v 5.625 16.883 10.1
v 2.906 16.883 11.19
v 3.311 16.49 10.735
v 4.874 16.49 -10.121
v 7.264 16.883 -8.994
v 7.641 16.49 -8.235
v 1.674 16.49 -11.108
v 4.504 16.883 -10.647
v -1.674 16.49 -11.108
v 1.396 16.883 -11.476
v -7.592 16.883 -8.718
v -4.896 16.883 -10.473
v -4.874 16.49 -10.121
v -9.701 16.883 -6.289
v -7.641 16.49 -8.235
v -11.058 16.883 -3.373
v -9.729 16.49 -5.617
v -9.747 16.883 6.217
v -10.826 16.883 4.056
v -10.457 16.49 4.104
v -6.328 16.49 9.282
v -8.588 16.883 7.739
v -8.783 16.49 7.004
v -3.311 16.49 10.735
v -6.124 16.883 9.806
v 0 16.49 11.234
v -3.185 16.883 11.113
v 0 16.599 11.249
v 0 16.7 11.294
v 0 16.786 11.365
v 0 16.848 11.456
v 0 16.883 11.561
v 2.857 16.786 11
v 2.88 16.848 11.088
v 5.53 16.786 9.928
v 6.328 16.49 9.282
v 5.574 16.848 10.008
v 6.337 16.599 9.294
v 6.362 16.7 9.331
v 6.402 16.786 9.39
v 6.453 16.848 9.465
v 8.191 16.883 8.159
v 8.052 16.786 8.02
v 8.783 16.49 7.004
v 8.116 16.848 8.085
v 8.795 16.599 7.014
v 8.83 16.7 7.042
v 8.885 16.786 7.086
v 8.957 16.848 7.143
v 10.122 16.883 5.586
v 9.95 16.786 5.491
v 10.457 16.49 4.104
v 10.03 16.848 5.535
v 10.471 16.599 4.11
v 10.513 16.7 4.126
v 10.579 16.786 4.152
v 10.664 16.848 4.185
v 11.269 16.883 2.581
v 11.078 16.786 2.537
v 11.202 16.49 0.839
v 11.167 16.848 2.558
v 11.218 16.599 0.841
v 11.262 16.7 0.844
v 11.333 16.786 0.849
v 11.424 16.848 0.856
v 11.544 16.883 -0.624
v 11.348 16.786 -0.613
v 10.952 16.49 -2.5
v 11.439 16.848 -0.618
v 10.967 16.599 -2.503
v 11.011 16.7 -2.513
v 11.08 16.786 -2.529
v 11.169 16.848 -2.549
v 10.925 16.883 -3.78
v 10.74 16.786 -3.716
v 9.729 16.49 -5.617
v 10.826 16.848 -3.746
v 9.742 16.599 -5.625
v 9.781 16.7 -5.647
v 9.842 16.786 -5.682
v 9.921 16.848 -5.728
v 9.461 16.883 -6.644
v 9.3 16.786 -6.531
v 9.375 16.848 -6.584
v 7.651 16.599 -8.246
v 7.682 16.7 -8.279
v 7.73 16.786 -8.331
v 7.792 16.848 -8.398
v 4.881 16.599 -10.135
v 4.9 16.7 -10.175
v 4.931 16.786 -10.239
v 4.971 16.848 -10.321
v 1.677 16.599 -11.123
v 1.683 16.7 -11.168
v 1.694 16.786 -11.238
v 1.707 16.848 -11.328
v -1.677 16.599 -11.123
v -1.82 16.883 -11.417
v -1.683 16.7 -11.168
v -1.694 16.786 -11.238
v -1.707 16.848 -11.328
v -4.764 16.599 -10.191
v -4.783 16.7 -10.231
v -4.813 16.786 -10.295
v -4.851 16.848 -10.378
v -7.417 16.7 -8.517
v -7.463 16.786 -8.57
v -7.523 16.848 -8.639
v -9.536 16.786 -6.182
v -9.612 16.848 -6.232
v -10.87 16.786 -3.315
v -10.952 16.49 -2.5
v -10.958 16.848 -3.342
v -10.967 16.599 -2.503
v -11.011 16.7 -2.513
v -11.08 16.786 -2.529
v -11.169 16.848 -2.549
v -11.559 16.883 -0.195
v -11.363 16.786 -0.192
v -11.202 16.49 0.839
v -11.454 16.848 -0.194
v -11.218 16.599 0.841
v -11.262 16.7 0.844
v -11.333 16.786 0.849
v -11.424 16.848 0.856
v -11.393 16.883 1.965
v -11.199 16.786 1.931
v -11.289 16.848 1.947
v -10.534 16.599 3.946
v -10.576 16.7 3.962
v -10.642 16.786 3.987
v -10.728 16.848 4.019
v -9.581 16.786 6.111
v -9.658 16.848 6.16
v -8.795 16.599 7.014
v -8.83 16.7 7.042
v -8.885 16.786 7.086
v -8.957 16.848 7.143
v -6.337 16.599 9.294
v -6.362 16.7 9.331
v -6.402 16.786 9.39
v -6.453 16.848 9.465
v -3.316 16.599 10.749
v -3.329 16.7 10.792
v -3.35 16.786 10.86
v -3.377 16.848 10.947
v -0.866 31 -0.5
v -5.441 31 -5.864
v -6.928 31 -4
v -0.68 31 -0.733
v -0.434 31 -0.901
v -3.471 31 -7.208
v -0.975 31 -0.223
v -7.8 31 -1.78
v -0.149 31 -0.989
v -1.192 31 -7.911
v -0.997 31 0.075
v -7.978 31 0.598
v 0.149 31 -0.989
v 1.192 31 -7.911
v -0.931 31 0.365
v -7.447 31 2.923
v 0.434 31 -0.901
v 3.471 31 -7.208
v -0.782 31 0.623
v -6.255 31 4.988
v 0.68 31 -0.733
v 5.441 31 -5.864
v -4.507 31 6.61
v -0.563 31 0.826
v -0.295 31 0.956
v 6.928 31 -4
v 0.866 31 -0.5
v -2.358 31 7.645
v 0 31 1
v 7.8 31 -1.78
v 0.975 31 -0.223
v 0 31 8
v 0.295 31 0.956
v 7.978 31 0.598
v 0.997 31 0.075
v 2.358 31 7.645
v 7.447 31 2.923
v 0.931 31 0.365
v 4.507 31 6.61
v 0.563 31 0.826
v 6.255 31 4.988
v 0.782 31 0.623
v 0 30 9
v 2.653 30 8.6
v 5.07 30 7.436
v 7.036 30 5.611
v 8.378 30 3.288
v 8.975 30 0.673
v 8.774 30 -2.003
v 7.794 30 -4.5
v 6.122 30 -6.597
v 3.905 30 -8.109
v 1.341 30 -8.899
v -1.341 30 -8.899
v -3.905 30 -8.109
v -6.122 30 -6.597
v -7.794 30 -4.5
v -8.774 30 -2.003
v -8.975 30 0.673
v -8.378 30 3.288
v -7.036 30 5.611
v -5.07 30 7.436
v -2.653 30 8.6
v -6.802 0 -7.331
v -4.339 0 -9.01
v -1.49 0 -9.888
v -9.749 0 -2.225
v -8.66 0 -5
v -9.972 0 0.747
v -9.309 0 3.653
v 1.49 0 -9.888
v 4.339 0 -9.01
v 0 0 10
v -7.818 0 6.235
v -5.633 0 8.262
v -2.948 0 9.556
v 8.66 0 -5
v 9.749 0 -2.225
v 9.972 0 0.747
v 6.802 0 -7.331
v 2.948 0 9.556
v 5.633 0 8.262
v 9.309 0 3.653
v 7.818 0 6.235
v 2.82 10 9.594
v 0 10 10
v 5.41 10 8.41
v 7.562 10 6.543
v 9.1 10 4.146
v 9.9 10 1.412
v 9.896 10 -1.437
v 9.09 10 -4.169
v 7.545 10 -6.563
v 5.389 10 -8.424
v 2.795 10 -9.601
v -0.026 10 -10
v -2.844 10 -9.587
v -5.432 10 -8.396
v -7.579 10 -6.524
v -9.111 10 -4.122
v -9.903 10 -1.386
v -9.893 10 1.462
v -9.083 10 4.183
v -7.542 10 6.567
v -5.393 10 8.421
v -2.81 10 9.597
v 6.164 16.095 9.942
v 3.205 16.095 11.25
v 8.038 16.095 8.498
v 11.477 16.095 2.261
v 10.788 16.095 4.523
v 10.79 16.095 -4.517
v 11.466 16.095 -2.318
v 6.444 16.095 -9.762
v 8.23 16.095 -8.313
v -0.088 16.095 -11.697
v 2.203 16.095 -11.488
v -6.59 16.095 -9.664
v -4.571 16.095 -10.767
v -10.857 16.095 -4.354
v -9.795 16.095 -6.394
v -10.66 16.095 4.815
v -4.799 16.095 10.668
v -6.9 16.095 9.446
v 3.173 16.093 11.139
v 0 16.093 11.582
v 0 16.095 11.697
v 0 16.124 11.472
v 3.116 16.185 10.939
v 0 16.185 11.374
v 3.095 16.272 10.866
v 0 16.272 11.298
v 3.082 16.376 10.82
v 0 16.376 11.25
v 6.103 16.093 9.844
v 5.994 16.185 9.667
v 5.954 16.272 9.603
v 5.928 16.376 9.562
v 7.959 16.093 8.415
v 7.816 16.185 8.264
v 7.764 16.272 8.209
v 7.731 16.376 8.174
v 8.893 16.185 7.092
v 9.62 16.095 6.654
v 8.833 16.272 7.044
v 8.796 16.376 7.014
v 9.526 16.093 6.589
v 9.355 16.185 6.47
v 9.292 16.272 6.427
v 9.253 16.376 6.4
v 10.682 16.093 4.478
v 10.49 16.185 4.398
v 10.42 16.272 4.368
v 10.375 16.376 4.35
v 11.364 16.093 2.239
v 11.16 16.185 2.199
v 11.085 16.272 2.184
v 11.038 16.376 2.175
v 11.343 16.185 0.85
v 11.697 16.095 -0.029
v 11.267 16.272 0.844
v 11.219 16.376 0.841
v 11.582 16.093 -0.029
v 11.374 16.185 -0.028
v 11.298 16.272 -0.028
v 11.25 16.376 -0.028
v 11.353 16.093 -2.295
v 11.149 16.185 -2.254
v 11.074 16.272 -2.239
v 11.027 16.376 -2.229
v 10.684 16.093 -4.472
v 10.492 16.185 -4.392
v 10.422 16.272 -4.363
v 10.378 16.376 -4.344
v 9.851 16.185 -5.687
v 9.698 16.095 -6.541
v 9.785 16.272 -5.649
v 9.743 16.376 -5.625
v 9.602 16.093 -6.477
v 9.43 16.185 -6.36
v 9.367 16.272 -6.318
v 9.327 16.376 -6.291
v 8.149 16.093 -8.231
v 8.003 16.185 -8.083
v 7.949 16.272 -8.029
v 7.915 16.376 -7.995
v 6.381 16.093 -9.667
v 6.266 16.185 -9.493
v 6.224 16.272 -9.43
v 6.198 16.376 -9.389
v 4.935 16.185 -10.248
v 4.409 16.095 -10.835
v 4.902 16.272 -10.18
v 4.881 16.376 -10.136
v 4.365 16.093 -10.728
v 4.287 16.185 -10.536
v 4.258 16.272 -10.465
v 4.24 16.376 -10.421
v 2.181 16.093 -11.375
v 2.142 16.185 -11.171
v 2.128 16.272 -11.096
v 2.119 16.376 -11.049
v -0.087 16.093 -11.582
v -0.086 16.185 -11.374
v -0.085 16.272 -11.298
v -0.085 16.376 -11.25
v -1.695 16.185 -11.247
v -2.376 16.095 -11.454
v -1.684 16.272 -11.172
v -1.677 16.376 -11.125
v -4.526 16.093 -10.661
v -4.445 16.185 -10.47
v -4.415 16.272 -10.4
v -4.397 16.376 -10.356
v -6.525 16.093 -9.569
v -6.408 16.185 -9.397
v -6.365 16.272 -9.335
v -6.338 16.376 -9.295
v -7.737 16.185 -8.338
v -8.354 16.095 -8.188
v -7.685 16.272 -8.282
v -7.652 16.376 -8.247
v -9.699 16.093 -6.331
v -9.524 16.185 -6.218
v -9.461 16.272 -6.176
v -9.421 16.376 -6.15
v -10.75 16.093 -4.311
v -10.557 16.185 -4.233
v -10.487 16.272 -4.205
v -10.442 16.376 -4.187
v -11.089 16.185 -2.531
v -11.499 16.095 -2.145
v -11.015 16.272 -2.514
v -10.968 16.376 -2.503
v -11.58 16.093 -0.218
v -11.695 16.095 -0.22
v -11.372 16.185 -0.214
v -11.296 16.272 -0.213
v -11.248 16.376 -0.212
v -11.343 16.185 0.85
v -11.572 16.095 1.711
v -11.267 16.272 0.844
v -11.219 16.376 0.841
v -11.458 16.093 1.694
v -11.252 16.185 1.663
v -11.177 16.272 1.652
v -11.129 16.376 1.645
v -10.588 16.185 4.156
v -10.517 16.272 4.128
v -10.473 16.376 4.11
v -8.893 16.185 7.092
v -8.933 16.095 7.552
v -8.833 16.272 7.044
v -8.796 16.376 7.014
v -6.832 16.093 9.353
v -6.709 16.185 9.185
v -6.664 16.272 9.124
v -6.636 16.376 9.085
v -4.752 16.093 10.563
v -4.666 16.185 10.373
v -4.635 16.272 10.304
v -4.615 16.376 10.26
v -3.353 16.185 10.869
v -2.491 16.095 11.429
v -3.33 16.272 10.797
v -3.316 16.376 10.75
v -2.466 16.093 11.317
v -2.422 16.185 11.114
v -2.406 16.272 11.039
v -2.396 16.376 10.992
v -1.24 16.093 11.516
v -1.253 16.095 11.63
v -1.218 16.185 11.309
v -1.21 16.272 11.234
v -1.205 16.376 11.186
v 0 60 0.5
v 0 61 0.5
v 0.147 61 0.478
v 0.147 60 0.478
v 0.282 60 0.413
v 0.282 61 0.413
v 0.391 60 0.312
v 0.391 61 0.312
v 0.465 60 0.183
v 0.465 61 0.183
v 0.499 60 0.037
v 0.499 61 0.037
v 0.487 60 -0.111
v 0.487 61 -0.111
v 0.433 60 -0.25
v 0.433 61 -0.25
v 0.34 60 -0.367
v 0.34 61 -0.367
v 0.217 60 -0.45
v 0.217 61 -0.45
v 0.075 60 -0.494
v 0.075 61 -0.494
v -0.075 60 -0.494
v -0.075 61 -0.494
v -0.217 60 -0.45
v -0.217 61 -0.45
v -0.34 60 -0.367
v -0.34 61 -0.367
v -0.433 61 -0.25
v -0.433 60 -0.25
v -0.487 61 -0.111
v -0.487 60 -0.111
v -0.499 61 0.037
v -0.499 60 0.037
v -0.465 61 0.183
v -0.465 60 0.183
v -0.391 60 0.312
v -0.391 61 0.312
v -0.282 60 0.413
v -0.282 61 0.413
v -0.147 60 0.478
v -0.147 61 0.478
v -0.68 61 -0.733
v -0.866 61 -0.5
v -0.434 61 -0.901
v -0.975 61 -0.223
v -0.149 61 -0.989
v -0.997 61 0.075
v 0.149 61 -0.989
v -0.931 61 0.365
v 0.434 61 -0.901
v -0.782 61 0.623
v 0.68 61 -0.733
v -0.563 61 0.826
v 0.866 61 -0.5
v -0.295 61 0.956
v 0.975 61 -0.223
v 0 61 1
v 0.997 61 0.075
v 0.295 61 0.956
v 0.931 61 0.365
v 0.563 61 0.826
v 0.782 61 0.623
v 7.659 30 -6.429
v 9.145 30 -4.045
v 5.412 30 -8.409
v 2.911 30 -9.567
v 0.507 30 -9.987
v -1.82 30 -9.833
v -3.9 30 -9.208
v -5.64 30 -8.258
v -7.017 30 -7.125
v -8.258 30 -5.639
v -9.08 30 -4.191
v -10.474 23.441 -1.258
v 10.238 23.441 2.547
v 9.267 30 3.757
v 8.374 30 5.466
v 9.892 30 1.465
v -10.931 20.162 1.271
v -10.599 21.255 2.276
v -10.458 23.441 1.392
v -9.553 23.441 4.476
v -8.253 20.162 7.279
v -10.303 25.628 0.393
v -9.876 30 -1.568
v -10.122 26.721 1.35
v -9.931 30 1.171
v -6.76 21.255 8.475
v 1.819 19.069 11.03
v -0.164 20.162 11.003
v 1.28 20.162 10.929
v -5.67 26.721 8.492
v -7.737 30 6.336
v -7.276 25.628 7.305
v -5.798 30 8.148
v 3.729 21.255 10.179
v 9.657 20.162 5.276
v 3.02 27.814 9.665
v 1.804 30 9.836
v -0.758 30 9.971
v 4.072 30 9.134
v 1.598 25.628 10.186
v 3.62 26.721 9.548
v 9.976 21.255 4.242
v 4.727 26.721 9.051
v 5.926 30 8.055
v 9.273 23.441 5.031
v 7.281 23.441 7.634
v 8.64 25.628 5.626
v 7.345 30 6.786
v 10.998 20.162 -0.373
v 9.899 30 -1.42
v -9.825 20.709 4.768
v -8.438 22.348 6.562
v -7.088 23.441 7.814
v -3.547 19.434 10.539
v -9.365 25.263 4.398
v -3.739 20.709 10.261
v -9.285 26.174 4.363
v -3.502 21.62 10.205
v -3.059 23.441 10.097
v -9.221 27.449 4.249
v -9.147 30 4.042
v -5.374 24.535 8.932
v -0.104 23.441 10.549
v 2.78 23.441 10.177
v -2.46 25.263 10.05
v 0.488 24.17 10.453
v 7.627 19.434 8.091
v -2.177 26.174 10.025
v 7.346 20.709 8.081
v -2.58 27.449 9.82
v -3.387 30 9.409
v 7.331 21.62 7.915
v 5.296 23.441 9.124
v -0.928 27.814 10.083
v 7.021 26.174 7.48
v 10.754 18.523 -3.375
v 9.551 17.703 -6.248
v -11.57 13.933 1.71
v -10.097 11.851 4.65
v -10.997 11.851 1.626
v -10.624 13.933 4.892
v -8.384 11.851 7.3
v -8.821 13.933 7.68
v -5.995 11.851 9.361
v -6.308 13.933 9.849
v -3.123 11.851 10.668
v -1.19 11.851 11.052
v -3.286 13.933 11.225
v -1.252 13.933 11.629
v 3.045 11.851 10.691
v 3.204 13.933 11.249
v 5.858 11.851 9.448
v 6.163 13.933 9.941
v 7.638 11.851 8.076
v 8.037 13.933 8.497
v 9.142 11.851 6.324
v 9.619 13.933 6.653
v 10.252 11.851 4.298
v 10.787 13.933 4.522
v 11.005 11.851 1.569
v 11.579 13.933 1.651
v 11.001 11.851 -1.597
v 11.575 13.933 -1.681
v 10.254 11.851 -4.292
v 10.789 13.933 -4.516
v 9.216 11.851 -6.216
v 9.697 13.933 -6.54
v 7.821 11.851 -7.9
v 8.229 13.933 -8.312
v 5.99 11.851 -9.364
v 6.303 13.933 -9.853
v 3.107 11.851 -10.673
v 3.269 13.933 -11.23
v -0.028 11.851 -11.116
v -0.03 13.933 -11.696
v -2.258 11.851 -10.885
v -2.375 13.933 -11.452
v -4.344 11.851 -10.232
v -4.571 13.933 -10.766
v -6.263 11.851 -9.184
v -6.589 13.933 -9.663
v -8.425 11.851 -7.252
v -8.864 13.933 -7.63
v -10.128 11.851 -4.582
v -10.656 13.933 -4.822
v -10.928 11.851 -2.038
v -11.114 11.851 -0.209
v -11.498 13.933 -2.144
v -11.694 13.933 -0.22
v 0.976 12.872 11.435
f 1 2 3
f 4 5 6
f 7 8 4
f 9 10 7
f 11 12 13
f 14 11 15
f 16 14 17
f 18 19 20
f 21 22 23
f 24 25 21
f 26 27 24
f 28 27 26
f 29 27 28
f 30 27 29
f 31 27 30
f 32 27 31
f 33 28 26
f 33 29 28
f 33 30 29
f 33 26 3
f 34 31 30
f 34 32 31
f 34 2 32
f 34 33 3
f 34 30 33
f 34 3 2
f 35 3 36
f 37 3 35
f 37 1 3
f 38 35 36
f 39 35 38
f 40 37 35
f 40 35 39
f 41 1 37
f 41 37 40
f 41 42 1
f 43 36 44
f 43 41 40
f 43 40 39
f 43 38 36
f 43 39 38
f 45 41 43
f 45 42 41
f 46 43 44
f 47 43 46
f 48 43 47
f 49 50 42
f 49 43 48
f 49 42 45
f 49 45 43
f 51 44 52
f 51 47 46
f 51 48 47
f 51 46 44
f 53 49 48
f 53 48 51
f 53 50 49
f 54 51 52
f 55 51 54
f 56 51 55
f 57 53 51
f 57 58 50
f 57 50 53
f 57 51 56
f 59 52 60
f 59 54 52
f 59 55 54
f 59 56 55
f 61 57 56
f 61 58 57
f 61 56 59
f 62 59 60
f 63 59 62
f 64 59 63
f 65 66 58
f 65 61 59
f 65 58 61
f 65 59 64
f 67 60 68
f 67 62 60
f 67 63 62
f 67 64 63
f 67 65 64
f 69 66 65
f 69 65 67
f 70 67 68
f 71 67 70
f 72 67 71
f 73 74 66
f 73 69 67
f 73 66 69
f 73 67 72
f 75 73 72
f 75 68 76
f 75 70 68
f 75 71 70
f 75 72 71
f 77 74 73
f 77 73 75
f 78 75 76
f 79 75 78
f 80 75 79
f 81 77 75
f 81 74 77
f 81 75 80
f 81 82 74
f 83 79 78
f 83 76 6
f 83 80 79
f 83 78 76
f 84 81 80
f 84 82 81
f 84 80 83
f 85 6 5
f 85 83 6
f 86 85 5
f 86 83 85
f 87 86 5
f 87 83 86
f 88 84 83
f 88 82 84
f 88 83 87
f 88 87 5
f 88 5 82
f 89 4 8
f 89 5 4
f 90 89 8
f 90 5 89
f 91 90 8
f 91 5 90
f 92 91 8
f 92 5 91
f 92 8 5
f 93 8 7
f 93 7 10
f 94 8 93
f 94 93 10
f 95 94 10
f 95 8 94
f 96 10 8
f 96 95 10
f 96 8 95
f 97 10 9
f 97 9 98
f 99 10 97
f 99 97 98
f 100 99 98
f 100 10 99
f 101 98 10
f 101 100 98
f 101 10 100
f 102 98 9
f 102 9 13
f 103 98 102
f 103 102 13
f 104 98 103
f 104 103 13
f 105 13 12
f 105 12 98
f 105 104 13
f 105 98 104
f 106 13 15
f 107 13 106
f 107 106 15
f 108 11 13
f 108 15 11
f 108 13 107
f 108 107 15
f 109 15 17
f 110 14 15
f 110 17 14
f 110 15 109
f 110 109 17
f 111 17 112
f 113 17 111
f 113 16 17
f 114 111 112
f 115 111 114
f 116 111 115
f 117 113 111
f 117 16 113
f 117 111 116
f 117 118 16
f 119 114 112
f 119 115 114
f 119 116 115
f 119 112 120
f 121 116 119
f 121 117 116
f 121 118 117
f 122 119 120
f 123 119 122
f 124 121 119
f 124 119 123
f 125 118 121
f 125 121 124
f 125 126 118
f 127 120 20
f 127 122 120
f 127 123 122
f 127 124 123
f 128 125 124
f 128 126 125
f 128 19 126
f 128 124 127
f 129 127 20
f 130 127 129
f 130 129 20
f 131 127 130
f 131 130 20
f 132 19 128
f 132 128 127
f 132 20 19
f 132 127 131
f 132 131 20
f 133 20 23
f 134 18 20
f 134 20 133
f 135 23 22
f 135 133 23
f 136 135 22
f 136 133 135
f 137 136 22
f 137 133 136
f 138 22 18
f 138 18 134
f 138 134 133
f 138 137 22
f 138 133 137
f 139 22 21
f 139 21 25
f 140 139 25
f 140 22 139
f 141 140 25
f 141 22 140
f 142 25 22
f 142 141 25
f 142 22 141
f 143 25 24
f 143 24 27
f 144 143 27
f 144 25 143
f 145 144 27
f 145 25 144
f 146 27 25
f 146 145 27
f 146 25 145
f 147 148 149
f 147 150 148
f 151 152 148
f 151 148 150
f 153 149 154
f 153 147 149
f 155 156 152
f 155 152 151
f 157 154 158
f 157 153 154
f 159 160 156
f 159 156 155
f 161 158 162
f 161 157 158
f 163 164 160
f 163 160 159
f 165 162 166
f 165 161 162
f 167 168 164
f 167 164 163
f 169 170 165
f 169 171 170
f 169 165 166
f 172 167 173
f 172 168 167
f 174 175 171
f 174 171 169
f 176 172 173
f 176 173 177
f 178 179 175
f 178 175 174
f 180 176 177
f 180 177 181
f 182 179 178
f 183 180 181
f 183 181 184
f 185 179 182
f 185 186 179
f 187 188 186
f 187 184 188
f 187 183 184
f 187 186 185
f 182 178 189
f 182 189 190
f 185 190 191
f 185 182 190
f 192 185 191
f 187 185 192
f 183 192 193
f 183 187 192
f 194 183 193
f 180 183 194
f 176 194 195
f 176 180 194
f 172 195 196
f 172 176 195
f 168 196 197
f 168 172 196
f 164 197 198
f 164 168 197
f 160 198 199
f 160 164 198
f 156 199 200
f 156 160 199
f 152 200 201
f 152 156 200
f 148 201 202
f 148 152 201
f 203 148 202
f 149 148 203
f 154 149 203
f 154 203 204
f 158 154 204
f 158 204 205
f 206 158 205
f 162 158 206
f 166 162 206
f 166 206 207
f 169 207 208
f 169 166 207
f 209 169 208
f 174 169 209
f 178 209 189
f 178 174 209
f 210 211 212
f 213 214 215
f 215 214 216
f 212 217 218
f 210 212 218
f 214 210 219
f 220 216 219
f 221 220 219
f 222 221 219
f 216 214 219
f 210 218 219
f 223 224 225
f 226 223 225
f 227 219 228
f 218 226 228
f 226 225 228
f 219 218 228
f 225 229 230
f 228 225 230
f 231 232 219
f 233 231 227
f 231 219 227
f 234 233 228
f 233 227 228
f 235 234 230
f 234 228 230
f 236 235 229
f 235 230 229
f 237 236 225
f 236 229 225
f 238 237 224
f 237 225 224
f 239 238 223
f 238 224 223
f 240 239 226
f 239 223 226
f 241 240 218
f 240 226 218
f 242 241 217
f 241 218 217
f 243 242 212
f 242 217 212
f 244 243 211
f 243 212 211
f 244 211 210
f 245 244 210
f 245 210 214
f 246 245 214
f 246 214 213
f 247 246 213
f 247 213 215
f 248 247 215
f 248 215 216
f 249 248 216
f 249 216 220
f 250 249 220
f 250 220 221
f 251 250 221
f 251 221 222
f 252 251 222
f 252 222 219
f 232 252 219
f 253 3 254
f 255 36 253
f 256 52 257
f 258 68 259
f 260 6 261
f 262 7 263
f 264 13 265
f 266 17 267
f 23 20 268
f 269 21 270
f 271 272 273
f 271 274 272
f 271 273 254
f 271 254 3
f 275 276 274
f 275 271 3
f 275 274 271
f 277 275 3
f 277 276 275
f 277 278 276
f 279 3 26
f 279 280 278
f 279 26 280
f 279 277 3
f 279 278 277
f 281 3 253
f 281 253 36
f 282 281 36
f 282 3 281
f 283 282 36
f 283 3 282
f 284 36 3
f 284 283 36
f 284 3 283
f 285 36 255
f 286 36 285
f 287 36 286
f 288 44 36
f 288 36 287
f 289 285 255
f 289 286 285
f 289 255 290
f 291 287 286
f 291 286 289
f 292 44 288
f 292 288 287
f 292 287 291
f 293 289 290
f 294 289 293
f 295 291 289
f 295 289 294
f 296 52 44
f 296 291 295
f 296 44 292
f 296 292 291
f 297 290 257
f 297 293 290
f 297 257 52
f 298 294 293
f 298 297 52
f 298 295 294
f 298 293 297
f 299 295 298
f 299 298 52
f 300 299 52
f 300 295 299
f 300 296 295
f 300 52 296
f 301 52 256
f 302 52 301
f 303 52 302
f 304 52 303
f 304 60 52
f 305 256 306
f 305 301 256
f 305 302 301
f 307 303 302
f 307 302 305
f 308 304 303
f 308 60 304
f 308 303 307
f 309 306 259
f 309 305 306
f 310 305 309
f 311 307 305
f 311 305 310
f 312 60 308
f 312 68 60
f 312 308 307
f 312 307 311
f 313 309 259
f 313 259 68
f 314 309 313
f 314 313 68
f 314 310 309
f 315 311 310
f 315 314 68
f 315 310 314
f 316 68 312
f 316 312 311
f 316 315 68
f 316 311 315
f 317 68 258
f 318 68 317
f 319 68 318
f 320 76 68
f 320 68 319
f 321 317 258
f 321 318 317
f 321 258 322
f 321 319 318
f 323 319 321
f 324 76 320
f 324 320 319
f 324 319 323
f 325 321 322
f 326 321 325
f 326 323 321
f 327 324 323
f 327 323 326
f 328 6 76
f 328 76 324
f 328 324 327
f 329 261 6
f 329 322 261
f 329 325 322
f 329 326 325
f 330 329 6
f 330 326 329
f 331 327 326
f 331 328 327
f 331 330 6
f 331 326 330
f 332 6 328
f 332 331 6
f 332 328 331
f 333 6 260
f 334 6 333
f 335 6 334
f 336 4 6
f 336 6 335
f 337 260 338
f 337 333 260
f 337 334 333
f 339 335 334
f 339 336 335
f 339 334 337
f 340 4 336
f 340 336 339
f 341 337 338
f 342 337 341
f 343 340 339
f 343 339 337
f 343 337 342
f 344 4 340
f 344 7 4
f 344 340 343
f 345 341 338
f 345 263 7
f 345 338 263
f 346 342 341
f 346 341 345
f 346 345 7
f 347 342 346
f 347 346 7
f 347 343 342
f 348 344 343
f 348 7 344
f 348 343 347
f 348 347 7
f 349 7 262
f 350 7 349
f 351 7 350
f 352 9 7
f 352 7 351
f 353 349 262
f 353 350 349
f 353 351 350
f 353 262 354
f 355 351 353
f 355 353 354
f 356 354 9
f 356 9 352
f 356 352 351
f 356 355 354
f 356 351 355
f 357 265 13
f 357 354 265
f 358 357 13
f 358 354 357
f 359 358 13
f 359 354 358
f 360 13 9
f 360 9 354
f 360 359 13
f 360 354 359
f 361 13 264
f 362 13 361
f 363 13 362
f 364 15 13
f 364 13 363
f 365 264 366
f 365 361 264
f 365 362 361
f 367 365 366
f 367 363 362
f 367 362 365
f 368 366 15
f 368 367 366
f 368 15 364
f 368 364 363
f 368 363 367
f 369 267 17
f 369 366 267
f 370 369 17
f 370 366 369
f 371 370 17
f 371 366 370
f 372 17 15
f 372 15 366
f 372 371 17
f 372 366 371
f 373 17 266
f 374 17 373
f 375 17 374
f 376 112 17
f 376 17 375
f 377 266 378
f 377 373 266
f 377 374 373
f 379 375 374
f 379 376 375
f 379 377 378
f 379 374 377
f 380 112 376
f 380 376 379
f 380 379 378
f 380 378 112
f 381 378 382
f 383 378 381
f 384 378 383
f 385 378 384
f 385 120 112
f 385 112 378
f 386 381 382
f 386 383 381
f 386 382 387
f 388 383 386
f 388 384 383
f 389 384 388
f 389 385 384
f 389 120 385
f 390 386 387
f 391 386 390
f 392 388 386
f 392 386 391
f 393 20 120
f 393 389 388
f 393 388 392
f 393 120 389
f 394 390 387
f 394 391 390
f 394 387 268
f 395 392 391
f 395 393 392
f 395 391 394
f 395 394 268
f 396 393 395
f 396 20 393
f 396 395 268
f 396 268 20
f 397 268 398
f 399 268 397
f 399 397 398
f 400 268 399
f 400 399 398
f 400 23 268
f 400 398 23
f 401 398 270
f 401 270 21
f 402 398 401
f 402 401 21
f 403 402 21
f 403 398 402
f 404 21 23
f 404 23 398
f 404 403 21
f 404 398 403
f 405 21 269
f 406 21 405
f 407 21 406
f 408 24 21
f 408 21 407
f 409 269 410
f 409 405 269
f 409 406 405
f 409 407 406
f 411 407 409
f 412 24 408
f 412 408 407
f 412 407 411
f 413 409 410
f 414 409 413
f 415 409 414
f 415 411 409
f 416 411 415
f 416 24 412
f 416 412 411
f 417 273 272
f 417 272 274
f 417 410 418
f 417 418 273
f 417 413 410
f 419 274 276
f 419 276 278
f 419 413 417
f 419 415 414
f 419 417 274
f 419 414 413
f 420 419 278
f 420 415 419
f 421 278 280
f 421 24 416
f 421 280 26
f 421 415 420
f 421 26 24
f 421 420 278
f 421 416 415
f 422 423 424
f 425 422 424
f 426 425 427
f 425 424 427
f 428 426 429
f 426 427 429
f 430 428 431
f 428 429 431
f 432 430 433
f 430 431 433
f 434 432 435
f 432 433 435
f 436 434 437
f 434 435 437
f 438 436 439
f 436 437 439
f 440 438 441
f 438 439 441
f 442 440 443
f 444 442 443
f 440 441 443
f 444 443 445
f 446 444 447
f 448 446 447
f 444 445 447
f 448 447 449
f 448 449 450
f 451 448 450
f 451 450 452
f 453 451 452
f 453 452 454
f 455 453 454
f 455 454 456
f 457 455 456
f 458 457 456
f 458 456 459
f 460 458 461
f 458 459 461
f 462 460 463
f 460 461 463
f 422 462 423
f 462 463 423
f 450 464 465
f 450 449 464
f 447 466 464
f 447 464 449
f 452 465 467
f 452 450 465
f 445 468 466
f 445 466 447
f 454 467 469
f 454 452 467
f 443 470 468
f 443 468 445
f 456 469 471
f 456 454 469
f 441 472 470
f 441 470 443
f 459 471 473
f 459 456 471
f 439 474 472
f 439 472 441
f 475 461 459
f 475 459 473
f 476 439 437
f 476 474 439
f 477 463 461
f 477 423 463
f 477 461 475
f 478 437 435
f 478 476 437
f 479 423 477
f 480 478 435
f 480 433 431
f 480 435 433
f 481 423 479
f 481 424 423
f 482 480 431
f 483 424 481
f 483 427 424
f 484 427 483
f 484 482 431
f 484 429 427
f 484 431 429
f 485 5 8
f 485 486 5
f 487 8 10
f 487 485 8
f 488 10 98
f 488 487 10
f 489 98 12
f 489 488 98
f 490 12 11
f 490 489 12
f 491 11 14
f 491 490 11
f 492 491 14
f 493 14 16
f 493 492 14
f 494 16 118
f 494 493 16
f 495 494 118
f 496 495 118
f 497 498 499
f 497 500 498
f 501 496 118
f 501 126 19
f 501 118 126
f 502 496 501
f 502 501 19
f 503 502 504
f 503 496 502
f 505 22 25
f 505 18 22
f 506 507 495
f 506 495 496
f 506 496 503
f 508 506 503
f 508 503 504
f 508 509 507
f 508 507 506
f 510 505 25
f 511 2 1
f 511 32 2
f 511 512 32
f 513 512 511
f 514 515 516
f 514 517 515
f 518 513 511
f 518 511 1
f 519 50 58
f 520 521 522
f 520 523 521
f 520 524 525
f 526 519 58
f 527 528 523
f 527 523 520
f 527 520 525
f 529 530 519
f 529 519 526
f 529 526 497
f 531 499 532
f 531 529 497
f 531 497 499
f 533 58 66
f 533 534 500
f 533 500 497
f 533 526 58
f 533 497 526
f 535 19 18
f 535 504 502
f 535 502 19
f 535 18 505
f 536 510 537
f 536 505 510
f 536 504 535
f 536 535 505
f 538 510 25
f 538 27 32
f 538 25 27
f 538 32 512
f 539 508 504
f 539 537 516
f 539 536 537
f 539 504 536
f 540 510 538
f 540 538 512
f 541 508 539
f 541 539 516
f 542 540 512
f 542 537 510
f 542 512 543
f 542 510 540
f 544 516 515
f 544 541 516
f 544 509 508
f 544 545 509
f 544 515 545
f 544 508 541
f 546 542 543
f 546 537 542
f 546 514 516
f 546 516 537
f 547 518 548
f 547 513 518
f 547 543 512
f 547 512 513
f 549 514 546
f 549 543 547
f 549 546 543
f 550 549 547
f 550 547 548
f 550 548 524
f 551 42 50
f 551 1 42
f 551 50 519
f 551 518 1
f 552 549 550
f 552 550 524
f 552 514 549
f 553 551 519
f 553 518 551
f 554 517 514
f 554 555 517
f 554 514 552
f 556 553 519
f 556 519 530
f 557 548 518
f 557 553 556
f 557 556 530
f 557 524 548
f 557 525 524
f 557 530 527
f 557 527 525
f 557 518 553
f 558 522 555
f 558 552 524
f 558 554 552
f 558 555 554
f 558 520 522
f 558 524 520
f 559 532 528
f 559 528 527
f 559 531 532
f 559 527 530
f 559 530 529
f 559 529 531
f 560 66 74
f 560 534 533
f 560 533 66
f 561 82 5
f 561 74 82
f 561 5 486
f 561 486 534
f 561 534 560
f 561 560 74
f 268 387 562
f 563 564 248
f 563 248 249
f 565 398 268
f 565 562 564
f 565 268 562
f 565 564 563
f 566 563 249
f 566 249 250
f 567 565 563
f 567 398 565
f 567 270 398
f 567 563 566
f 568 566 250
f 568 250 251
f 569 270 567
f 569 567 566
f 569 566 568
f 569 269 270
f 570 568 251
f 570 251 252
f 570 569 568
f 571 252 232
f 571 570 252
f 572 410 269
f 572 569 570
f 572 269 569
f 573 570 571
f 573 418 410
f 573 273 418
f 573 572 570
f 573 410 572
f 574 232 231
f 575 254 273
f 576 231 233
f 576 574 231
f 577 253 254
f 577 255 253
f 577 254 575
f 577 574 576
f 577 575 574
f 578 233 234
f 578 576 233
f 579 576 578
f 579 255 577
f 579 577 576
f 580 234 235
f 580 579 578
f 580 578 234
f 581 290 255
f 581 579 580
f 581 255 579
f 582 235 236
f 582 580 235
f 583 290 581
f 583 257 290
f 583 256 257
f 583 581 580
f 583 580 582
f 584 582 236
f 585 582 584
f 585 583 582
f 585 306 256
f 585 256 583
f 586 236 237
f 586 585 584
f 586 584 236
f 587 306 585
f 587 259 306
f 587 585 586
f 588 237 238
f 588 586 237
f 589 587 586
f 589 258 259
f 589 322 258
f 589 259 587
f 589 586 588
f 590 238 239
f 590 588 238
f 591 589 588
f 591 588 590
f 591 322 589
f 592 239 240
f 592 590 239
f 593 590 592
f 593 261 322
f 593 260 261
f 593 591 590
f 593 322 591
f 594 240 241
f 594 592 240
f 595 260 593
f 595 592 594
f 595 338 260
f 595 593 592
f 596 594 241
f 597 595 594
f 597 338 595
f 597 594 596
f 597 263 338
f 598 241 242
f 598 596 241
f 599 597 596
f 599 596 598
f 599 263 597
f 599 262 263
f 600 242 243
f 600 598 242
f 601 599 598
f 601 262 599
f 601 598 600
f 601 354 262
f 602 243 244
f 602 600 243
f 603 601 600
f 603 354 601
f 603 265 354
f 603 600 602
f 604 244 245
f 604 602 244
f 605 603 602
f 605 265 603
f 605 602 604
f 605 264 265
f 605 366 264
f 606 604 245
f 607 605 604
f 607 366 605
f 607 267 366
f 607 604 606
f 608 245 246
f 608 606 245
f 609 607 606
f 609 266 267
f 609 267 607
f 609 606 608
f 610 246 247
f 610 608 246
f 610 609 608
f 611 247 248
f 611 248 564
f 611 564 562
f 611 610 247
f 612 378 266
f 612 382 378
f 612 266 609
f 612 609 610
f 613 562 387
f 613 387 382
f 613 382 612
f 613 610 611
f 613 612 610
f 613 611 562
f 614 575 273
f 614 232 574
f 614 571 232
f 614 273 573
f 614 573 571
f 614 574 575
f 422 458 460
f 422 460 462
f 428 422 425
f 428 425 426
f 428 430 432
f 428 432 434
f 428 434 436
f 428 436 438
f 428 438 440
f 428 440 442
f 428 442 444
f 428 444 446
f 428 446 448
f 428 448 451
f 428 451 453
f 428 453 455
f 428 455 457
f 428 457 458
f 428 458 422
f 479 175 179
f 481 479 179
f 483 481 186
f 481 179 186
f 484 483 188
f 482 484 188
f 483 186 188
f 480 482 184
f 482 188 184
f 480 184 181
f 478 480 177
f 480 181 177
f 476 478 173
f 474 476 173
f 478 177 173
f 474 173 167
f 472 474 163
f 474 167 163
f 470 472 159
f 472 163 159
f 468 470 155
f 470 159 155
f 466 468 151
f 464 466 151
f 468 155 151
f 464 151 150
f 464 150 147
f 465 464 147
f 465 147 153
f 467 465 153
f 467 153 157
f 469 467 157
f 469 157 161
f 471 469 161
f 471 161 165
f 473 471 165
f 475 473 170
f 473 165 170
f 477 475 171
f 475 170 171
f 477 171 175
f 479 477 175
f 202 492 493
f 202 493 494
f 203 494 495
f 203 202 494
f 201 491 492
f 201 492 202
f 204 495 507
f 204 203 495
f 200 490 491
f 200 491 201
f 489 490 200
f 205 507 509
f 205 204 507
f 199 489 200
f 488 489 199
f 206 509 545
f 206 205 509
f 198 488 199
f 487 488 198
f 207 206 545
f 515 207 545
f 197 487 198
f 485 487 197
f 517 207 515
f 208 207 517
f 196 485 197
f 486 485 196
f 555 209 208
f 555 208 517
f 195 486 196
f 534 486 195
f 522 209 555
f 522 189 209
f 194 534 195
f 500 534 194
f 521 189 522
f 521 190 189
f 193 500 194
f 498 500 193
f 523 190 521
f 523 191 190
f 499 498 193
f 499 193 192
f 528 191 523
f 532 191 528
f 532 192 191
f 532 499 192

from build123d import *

# Parameters (mm, degrees)
SKETCH2_R           = 10
BOSS_EXTRUDE1_DEPTH = 10
FILLET1_R           = 8
SKETCH5_R           = 0.4
SKETCH6_R           = 9
BOSS_EXTRUDE2_DEPTH = 1
CHAMFER1_SIZE       = 1
SKETCH7_R           = 1
BOSS_EXTRUDE3_DEPTH = 30
SKETCH8_R           = 0.5
CUT_EXTRUDE1_DEPTH  = 1


with BuildPart() as part:
    # Sketch2 → Boss-Extrude1 (new body)
    with BuildSketch(Plane(origin=(0, 0, 0), x_dir=(1, 0, 0), z_dir=(0, 1, 0))):
        with Locations(Location((0, 0, 0), (0, 0, 270))):
            Circle(SKETCH2_R)
    extrude(amount=BOSS_EXTRUDE1_DEPTH)

    # Loft1: read off the stored shape, not the designer's step
    # Loft1: loft between two sections, ruled curve by curve
    loft1_from = [
        Edge.make_bspline([(-12.860252555, 10, 1.901027147), (-9.058198262, 10, 27.621532257), (16.662306849, 10, 23.819477964), (12.860252555, 10, -1.901027147), (9.058198262, 10, -27.621532257), (-16.662306849, 10, -23.819477964), (-12.860252555, 10, 1.901027147)], [0, 0, 0, 0, 0.5, 0.5, 0.5, 1, 1, 1, 1], 3, [1, 0.333333333, 0.333333333, 1, 0.333333333, 0.333333333, 1]),
    ]
    loft1_to = [
        Edge.make_bspline([(-9.079588938, 30, -4.190592406), (-17.460773749, 30, 13.968585471), (0.698404127, 30, 22.349770282), (9.079588938, 30, 4.190592406), (17.460773749, 30, -13.968585471), (-0.698404127, 30, -22.349770282), (-9.079588938, 30, -4.190592406)], [0, 0, 0, 0, 0.5, 0.5, 0.5, 1, 1, 1, 1], 3, [1, 0.333333333, 0.333333333, 1, 0.333333333, 0.333333333, 1]),
    ]
    loft1 = Solid(Shell([*[Face.make_surface_from_curves(loft1_from[k], loft1_to[k]) for k in range(1)], Face(Wire(loft1_from)), Face(Wire(loft1_to))]))
    add(loft1)

    # Fillet1
    # the kernel refuses this fillet: 8 mm, written as the material it takes off along each edge
    with BuildSketch(Plane(origin=(0, 10, 0), x_dir=(-0.9892501965607676, 0, 0.14623285747219308), z_dir=(-0.14623285747219308, 0, -0.9892501965607676))) as fillet1_piece_1:
        with BuildLine():
            CenterArc((3.770111358, 5.018813356), FILLET1_R, 321.144997334, 49.449726364)
            Line((10, 0), (10.124597773, -0.100376267))
            ThreePointArc((10.124597773, -0.100376267), (11.5, -0.16), (13, -0.16))
            Line((13, -0.16), (13.155876196, 0.036091708))
            ThreePointArc((13.155876196, 0.036091708), (12.43891649, 3.270626899), (11.791002002, 6.519117749))
            Line((11.791002002, 6.519117749), (11.633729636, 6.489700016))
        make_face()
    revolve(axis=Axis((0, 10, 0), (0, 1, 0)), mode=Mode.SUBTRACT)

    # Sketch5 → Cut-Revolve1 (revolve, cut)
    with BuildSketch(Plane(origin=(0, 0, 0), x_dir=(0, 0, -1), z_dir=(1, 0, 0))):
        with Locations((-11.633729637, 16.489700016)):
            Circle(SKETCH5_R)
    revolve(axis=Axis((0, 16.489700016, 0), (0, 1, 0)), mode=Mode.SUBTRACT)

    # Sketch6 → Boss-Extrude2 (add)
    with BuildSketch(Plane(origin=(0, 30, 0), x_dir=(1, 0, 0), z_dir=(0, 1, 0))):
        with Locations(Location((0, 0, 0), (0, 0, 270))):
            Circle(SKETCH6_R)
    extrude(amount=BOSS_EXTRUDE2_DEPTH)

    # Chamfer1
    chamfer1_edges = [part.edges().sort_by_distance(p)[0] for p in [
        (0, 31, -9),
    ]]
    chamfer(chamfer1_edges, length=CHAMFER1_SIZE - 0.0001)  # a hair under: the kernel refuses the full size

    # Sketch7 → Boss-Extrude3 (add)
    with BuildSketch(Plane(origin=(0, 31, 0), x_dir=(1, 0, 0), z_dir=(0, 1, 0))):
        with Locations(Location((0, 0, 0), (0, 0, 270))):
            Circle(SKETCH7_R)
    extrude(amount=BOSS_EXTRUDE3_DEPTH)

    # Sketch8 → Cut-Extrude1 (cut)
    with BuildSketch(Plane(origin=(0, 61, 0), x_dir=(1, 0, 0), z_dir=(0, 1, 0))):
        with Locations(Location((0, 0, 0), (0, 0, 270))):
            Circle(SKETCH8_R)
    extrude(amount=-CUT_EXTRUDE1_DEPTH, mode=Mode.SUBTRACT)


solid = part.part
